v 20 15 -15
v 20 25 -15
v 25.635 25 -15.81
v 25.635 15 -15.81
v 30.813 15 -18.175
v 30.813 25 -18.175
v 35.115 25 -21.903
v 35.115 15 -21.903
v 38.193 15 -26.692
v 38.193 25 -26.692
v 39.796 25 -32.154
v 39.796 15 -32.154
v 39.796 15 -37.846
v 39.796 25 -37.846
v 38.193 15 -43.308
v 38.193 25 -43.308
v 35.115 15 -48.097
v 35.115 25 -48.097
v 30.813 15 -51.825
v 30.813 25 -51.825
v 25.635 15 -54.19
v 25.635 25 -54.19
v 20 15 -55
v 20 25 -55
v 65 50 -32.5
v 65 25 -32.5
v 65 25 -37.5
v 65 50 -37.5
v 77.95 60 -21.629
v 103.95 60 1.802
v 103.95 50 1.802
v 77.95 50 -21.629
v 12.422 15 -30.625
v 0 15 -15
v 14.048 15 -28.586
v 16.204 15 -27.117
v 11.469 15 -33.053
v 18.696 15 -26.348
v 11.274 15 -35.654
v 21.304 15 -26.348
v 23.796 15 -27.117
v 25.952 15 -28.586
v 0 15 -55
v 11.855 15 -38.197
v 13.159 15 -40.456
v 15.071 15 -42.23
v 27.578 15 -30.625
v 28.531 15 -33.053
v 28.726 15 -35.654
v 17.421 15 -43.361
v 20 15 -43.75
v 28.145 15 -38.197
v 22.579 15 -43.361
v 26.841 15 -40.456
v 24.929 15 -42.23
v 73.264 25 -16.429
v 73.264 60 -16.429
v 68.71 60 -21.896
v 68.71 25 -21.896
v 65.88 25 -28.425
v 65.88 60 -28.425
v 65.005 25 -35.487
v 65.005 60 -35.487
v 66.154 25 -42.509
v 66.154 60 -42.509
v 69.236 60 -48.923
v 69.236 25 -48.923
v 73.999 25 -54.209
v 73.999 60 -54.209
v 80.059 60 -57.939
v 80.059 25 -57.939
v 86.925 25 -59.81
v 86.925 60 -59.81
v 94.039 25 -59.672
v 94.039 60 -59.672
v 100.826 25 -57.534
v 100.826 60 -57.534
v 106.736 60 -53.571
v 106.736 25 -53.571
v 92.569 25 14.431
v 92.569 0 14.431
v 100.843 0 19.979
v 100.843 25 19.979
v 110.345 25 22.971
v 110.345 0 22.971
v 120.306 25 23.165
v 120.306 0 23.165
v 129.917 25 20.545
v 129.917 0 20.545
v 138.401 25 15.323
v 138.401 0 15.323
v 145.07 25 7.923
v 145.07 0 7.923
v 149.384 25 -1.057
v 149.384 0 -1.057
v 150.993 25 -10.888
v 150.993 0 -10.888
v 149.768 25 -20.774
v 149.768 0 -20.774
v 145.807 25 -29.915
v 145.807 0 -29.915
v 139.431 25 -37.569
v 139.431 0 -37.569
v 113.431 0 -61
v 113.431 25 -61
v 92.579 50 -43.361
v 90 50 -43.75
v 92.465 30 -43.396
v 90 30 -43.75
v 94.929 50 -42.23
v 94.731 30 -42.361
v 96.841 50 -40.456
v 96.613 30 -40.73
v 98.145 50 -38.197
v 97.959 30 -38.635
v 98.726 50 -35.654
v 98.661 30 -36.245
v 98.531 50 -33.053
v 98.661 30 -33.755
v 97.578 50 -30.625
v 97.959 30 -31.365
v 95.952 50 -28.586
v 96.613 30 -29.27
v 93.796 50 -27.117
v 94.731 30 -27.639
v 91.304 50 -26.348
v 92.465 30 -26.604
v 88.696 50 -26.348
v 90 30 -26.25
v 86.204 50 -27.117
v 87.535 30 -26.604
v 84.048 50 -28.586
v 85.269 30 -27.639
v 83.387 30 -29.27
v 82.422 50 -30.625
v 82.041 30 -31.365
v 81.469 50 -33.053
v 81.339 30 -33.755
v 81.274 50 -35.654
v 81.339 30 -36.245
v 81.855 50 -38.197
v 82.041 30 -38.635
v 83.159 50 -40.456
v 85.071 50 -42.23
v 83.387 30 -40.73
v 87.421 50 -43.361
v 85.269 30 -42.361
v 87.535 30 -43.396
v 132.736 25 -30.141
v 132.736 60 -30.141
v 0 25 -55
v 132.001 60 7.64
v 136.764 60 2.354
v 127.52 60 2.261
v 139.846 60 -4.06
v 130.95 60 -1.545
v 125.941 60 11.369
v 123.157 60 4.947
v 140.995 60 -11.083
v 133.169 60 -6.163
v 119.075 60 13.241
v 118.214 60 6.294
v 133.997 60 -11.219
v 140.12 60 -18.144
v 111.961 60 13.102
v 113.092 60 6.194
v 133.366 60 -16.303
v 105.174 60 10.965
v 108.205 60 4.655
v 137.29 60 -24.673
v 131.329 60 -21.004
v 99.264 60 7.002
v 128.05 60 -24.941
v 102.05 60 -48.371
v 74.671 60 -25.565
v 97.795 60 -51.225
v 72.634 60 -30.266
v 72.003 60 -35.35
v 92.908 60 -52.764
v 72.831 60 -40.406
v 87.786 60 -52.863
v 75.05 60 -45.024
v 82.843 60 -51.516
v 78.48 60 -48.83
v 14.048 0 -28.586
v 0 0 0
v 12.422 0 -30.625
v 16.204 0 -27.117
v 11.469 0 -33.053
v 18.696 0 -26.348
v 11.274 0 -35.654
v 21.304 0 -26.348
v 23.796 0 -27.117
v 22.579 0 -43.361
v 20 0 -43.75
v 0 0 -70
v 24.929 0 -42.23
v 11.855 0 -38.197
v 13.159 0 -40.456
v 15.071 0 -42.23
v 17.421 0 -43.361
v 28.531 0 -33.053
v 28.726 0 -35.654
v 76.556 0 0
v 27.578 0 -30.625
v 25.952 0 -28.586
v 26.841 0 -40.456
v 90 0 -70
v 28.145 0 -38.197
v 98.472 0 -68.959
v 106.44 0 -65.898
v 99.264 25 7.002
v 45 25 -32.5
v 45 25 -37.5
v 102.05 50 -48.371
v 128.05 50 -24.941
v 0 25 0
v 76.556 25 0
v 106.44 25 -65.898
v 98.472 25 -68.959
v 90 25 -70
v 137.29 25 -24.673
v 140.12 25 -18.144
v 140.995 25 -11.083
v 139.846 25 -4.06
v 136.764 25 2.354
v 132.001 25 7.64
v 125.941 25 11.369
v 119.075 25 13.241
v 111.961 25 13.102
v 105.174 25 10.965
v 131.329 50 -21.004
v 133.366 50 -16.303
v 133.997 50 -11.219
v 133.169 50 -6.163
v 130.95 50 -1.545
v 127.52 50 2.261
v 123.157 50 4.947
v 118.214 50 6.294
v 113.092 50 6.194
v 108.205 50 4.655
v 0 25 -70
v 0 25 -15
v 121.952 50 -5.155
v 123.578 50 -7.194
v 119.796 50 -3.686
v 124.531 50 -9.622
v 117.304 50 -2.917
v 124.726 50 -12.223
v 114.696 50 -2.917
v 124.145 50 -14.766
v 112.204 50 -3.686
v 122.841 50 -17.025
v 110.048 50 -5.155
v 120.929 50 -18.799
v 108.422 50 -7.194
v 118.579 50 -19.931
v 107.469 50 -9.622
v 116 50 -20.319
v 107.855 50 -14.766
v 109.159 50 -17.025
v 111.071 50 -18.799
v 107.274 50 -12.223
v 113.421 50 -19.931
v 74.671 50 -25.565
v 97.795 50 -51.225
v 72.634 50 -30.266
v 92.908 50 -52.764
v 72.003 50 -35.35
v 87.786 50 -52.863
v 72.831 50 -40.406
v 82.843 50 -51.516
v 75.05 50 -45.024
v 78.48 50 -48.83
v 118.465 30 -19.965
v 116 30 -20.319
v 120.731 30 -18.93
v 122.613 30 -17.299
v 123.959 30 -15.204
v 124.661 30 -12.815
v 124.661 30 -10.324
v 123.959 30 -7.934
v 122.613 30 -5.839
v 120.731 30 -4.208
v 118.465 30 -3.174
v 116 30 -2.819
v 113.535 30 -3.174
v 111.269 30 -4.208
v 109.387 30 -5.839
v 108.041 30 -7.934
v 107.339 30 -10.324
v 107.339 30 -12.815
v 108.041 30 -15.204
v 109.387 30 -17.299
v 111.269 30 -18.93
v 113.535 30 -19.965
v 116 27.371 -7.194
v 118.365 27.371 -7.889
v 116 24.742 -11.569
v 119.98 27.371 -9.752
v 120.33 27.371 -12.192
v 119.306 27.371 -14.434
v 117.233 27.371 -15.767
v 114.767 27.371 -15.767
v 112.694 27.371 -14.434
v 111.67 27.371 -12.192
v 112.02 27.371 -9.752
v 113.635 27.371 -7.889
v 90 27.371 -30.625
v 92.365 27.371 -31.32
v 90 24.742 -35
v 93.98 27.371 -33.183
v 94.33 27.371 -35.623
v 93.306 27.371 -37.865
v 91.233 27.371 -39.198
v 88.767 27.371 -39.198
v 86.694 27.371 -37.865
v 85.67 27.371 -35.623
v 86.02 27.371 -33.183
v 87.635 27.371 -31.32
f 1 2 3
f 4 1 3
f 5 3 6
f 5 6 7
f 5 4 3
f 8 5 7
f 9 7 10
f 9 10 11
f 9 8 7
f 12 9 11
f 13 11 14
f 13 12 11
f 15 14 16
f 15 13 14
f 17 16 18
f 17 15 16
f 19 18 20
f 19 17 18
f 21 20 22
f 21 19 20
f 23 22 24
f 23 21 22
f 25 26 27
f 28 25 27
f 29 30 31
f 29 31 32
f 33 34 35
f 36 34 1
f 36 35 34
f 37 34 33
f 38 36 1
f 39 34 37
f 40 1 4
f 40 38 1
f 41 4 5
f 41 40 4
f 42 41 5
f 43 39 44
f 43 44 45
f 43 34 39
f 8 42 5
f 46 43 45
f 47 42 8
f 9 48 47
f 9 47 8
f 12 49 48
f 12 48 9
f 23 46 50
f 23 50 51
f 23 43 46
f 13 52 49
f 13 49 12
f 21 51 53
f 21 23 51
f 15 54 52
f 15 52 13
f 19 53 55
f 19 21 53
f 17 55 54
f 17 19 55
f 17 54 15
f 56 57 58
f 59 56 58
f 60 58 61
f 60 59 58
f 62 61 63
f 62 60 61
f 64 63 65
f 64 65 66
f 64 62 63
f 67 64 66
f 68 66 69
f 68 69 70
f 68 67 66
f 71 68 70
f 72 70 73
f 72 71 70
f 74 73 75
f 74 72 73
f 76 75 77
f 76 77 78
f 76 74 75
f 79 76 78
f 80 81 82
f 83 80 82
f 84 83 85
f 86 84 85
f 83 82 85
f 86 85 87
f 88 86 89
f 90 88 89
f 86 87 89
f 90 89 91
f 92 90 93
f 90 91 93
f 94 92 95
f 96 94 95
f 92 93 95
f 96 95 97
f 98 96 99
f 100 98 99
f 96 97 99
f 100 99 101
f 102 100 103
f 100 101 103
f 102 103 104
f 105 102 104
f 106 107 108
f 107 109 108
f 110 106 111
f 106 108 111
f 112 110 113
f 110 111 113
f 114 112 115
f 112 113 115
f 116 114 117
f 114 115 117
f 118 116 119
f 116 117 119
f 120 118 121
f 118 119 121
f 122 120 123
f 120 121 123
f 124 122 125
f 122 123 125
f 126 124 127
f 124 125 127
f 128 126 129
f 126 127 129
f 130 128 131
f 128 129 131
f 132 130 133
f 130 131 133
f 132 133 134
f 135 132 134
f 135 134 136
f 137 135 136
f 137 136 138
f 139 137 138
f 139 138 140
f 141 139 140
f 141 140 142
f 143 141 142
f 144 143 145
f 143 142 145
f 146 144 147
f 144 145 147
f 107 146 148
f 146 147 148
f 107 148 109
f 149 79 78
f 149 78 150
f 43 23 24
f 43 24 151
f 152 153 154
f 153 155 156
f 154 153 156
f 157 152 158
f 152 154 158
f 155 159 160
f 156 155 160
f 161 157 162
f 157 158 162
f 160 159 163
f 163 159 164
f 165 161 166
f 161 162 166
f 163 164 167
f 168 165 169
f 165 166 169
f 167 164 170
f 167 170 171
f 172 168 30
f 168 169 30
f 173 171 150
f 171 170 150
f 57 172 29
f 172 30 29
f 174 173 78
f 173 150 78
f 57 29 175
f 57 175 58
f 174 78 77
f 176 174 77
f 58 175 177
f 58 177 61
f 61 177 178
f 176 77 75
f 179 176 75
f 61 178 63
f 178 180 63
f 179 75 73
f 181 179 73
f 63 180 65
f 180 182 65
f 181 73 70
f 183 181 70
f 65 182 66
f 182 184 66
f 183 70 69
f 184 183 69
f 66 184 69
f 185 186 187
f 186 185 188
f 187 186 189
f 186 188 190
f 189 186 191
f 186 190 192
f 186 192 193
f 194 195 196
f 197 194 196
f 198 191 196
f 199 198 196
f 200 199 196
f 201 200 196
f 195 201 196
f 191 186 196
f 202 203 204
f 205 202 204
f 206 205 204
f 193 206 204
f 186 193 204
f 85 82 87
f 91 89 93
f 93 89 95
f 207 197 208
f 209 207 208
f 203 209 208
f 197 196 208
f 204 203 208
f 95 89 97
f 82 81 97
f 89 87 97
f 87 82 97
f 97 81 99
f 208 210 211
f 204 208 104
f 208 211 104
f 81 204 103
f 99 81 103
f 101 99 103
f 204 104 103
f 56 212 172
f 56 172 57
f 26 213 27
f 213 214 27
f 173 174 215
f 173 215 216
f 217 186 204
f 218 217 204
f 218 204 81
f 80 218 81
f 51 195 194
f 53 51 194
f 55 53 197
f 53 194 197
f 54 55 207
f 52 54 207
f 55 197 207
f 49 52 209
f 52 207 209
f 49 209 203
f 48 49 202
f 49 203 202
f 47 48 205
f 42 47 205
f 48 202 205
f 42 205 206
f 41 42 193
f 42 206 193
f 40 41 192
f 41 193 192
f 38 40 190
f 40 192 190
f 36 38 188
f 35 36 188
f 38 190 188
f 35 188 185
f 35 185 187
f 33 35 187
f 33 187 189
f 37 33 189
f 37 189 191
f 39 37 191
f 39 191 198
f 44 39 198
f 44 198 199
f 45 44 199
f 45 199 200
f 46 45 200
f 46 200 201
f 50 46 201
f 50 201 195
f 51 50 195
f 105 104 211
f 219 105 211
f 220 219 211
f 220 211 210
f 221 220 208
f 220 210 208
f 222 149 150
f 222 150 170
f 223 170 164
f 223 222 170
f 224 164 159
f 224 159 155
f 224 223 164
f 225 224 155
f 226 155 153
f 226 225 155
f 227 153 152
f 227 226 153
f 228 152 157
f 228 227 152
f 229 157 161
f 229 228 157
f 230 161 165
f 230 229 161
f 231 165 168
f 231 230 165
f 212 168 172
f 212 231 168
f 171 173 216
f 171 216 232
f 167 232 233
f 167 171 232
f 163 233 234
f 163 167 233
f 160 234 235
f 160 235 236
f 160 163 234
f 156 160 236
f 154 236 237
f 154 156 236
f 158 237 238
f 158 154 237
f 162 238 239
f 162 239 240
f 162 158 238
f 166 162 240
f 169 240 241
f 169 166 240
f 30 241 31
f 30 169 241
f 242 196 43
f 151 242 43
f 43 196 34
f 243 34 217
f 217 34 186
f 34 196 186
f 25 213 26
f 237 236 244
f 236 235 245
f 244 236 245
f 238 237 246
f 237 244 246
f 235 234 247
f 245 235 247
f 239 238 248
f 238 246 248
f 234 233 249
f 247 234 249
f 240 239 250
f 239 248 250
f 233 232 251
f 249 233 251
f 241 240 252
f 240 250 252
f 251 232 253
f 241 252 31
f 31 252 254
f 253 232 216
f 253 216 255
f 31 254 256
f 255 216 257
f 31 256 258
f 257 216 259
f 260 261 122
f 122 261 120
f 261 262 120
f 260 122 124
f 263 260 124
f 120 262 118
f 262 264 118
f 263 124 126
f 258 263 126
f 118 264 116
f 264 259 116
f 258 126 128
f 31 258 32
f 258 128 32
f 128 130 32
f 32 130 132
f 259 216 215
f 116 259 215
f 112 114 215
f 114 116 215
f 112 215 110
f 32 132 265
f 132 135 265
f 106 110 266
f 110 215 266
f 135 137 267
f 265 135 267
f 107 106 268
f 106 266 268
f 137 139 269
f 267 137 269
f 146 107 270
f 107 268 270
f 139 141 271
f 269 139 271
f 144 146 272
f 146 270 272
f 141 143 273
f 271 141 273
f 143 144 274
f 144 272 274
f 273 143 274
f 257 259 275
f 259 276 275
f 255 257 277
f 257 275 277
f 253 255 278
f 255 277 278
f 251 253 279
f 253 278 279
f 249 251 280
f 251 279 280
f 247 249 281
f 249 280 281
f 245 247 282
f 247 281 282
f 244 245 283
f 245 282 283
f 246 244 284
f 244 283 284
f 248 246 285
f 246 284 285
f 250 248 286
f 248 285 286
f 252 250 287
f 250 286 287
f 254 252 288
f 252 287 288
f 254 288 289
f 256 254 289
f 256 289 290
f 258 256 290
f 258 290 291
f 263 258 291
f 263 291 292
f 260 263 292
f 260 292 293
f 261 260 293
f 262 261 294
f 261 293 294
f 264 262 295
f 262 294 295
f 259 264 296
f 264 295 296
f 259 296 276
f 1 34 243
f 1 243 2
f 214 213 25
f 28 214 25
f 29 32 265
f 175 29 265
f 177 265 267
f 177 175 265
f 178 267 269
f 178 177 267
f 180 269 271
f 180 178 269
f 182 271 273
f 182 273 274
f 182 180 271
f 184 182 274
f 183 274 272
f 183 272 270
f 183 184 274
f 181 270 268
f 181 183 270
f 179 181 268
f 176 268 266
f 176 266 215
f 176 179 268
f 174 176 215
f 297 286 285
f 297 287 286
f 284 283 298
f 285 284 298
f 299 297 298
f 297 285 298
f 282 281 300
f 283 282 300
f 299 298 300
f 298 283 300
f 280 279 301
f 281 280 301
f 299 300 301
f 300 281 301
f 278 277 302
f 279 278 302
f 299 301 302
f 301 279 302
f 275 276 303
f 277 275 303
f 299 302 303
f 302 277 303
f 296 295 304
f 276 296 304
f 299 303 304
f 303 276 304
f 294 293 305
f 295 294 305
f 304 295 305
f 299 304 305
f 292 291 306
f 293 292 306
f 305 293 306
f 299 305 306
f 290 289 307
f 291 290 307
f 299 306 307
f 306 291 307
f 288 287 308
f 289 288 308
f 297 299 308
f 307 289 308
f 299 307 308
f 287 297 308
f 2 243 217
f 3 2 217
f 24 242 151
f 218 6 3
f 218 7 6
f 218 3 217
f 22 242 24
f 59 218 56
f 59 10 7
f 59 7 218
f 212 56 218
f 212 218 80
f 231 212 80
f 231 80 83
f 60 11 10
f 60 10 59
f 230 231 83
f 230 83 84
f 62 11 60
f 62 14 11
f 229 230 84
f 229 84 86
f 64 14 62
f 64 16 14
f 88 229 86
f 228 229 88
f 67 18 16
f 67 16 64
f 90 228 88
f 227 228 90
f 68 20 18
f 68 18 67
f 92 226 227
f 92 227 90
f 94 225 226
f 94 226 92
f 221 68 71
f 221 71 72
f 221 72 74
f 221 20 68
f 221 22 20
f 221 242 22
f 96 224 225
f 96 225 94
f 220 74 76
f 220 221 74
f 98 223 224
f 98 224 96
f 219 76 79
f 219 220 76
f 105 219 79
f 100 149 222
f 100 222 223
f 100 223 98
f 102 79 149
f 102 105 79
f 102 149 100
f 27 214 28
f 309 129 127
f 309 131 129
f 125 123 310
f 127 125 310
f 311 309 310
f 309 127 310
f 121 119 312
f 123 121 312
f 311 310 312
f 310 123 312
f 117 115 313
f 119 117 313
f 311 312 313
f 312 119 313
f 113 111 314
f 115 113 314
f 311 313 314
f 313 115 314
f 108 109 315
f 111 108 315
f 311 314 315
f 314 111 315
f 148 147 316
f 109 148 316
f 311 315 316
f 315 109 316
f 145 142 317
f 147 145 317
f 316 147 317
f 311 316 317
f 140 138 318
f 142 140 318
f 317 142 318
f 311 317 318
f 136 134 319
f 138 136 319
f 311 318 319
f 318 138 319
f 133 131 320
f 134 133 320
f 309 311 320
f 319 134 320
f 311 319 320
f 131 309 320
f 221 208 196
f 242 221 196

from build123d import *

# Parameters (mm, degrees)
BOSS_EXTRUDE1_DEPTH    = 25
BOSS_EXTRUDE2_DEPTH    = 35
CUT_EXTRUDE1_DEPTH     = 10
M20_TAPPED_HOLE1_D     = 17.5
M20_TAPPED_HOLE1_DEPTH = 20
M20_TAPPED_HOLE1_TIP   = 5.257530416
M20_TAPPED_HOLE2_D     = 17.5
M20_TAPPED_HOLE2_DEPTH = 27.5
M20_TAPPED_HOLE2_TIP   = 5.257530416
CUT_EXTRUDE2_START     = -10
SKETCH8_R              = 8.75
CUT_EXTRUDE2_DEPTH     = 10
SKETCH9_W              = 20
SKETCH9_H              = 2.5
BOSS_EXTRUDE4_DEPTH    = 25
CHAMFER1_SIZE          = 25
CHAMFER1_SIZE_2        = 20


with BuildPart() as part:
    # Sketch1 → Boss-Extrude1 (new body)
    with BuildSketch(Plane(origin=(0, 0, 0), x_dir=(1, 0, 0), z_dir=(0, 1, 0))):
        with BuildLine():
            Line((0, 70), (0, 0))
            Line((0, 0), (76.556127607, 0))
            Line((76.556127607, 0), (92.569250972, -14.430749028))
            ThreePointArc((92.569250972, -14.430749028), (142, -11.861498055), (139.430749028, 37.569250972))
            Line((139.430749028, 37.569250972), (113.430749028, 61))
            ThreePointArc((113.430749028, 61), (102.549900398, 67.672618505), (90, 70))
            Line((90, 70), (0, 70))
        make_face()
    extrude(amount=BOSS_EXTRUDE1_DEPTH)

    # Sketch2 → Boss-Extrude2 (add)
    with BuildSketch(Plane(origin=(0, 25, 0), x_dir=(1, 0, 0), z_dir=(0, 1, 0))):
        with BuildLine():
            Line((99.263750694, -7.002177599), (73.263750694, 16.428571429))
            ThreePointArc((73.263750694, 16.428571429), (71.428571429, 51.736249306), (106.736249306, 53.571428571))
            Line((106.736249306, 53.571428571), (132.736249306, 30.140679544))
            ThreePointArc((132.736249306, 30.140679544), (134.571428571, -5.166998333), (99.263750694, -7.002177599))
        make_face()
    extrude(amount=BOSS_EXTRUDE2_DEPTH)

    # Sketch3 → Cut-Extrude1 (cut)
    with BuildSketch(Plane(origin=(0, 60, 0), x_dir=(1, 0, 0), z_dir=(0, 1, 0))):
        with BuildLine():
            Line((103.9499005, -1.802177599), (77.9499005, 21.628571429))
            ThreePointArc((77.9499005, 21.628571429), (76.628571429, 47.0500995), (102.0500995, 48.371428571))
            Line((102.0500995, 48.371428571), (128.0500995, 24.940679544))
            ThreePointArc((128.0500995, 24.940679544), (129.371428571, -0.480848528), (103.9499005, -1.802177599))
        make_face()
    extrude(amount=-CUT_EXTRUDE1_DEPTH, mode=Mode.SUBTRACT)

    # M20 Tapped Hole1
    with Locations(Plane(origin=(90, 50, -35), x_dir=(0, 0, 1), z_dir=(0, 1, 0))):
        with Locations((0, 0), (23.430749028, 26)):
            Hole(M20_TAPPED_HOLE1_D / 2, depth=M20_TAPPED_HOLE1_DEPTH)
            with Locations((0, 0, -(M20_TAPPED_HOLE1_DEPTH + M20_TAPPED_HOLE1_TIP / 2))):  # 118° drill point
                Cone(0, M20_TAPPED_HOLE1_D / 2, M20_TAPPED_HOLE1_TIP, mode=Mode.SUBTRACT)

    # M20 Tapped Hole2
    with Locations(Plane(origin=(20, 25, -35), x_dir=(0, 0, 1), z_dir=(0, 1, 0))):
        with Locations((0, 0)):
            Hole(M20_TAPPED_HOLE2_D / 2, depth=M20_TAPPED_HOLE2_DEPTH)
            with Locations((0, 0, -(M20_TAPPED_HOLE2_DEPTH + M20_TAPPED_HOLE2_TIP / 2))):  # 118° drill point
                Cone(0, M20_TAPPED_HOLE2_D / 2, M20_TAPPED_HOLE2_TIP, mode=Mode.SUBTRACT)

    # Sketch8 → Cut-Extrude2 (cut)
    with BuildSketch(Plane(origin=(0, 25, 0), x_dir=(1, 0, 0), z_dir=(0, 1, 0)).offset(CUT_EXTRUDE2_START)):
        with BuildLine():
            Line((20, 55), (0, 55))
            Line((0, 55), (0, 15))
            Line((0, 15), (20, 15))
            ThreePointArc((20, 15), (40, 35), (20, 55))
        make_face()
        with Locations(Location((20, 35, 0), (0, 0, 270))):
            Circle(SKETCH8_R, mode=Mode.SUBTRACT)
    extrude(amount=CUT_EXTRUDE2_DEPTH, mode=Mode.SUBTRACT)


with BuildPart() as body_2:
    # Sketch9 → Boss-Extrude4 (new body)
    with BuildSketch(Plane(origin=(0, 25, 0), x_dir=(1, 0, 0), z_dir=(0, 1, 0))):
        with Locations((55, 33.75)):
            Rectangle(SKETCH9_W, SKETCH9_H)
        with Locations((55, 36.25)):
            Rectangle(SKETCH9_W, SKETCH9_H)
    extrude(amount=BOSS_EXTRUDE4_DEPTH)

    # Chamfer1
    # the kernel refuses this chamfer: 25, 20 mm, written as the material it takes off along each edge
    with BuildSketch(Plane(origin=(45, 50, 31.971090443), x_dir=(-0.024223843712695276, -0.9997065596442702, 0), z_dir=(0, 0, -1))) as chamfer1_piece_1:
        Polygon((CHAMFER1_SIZE * 0.999706559644, -CHAMFER1_SIZE * 0.0242238437127), (-CHAMFER1_SIZE_2 * 0.0242238437127, -CHAMFER1_SIZE_2 * 0.999706559644), (0, 0), align=None)
    extrude(amount=133.942180887, mode=Mode.SUBTRACT)


solid = Compound([part.part, body_2.part])
